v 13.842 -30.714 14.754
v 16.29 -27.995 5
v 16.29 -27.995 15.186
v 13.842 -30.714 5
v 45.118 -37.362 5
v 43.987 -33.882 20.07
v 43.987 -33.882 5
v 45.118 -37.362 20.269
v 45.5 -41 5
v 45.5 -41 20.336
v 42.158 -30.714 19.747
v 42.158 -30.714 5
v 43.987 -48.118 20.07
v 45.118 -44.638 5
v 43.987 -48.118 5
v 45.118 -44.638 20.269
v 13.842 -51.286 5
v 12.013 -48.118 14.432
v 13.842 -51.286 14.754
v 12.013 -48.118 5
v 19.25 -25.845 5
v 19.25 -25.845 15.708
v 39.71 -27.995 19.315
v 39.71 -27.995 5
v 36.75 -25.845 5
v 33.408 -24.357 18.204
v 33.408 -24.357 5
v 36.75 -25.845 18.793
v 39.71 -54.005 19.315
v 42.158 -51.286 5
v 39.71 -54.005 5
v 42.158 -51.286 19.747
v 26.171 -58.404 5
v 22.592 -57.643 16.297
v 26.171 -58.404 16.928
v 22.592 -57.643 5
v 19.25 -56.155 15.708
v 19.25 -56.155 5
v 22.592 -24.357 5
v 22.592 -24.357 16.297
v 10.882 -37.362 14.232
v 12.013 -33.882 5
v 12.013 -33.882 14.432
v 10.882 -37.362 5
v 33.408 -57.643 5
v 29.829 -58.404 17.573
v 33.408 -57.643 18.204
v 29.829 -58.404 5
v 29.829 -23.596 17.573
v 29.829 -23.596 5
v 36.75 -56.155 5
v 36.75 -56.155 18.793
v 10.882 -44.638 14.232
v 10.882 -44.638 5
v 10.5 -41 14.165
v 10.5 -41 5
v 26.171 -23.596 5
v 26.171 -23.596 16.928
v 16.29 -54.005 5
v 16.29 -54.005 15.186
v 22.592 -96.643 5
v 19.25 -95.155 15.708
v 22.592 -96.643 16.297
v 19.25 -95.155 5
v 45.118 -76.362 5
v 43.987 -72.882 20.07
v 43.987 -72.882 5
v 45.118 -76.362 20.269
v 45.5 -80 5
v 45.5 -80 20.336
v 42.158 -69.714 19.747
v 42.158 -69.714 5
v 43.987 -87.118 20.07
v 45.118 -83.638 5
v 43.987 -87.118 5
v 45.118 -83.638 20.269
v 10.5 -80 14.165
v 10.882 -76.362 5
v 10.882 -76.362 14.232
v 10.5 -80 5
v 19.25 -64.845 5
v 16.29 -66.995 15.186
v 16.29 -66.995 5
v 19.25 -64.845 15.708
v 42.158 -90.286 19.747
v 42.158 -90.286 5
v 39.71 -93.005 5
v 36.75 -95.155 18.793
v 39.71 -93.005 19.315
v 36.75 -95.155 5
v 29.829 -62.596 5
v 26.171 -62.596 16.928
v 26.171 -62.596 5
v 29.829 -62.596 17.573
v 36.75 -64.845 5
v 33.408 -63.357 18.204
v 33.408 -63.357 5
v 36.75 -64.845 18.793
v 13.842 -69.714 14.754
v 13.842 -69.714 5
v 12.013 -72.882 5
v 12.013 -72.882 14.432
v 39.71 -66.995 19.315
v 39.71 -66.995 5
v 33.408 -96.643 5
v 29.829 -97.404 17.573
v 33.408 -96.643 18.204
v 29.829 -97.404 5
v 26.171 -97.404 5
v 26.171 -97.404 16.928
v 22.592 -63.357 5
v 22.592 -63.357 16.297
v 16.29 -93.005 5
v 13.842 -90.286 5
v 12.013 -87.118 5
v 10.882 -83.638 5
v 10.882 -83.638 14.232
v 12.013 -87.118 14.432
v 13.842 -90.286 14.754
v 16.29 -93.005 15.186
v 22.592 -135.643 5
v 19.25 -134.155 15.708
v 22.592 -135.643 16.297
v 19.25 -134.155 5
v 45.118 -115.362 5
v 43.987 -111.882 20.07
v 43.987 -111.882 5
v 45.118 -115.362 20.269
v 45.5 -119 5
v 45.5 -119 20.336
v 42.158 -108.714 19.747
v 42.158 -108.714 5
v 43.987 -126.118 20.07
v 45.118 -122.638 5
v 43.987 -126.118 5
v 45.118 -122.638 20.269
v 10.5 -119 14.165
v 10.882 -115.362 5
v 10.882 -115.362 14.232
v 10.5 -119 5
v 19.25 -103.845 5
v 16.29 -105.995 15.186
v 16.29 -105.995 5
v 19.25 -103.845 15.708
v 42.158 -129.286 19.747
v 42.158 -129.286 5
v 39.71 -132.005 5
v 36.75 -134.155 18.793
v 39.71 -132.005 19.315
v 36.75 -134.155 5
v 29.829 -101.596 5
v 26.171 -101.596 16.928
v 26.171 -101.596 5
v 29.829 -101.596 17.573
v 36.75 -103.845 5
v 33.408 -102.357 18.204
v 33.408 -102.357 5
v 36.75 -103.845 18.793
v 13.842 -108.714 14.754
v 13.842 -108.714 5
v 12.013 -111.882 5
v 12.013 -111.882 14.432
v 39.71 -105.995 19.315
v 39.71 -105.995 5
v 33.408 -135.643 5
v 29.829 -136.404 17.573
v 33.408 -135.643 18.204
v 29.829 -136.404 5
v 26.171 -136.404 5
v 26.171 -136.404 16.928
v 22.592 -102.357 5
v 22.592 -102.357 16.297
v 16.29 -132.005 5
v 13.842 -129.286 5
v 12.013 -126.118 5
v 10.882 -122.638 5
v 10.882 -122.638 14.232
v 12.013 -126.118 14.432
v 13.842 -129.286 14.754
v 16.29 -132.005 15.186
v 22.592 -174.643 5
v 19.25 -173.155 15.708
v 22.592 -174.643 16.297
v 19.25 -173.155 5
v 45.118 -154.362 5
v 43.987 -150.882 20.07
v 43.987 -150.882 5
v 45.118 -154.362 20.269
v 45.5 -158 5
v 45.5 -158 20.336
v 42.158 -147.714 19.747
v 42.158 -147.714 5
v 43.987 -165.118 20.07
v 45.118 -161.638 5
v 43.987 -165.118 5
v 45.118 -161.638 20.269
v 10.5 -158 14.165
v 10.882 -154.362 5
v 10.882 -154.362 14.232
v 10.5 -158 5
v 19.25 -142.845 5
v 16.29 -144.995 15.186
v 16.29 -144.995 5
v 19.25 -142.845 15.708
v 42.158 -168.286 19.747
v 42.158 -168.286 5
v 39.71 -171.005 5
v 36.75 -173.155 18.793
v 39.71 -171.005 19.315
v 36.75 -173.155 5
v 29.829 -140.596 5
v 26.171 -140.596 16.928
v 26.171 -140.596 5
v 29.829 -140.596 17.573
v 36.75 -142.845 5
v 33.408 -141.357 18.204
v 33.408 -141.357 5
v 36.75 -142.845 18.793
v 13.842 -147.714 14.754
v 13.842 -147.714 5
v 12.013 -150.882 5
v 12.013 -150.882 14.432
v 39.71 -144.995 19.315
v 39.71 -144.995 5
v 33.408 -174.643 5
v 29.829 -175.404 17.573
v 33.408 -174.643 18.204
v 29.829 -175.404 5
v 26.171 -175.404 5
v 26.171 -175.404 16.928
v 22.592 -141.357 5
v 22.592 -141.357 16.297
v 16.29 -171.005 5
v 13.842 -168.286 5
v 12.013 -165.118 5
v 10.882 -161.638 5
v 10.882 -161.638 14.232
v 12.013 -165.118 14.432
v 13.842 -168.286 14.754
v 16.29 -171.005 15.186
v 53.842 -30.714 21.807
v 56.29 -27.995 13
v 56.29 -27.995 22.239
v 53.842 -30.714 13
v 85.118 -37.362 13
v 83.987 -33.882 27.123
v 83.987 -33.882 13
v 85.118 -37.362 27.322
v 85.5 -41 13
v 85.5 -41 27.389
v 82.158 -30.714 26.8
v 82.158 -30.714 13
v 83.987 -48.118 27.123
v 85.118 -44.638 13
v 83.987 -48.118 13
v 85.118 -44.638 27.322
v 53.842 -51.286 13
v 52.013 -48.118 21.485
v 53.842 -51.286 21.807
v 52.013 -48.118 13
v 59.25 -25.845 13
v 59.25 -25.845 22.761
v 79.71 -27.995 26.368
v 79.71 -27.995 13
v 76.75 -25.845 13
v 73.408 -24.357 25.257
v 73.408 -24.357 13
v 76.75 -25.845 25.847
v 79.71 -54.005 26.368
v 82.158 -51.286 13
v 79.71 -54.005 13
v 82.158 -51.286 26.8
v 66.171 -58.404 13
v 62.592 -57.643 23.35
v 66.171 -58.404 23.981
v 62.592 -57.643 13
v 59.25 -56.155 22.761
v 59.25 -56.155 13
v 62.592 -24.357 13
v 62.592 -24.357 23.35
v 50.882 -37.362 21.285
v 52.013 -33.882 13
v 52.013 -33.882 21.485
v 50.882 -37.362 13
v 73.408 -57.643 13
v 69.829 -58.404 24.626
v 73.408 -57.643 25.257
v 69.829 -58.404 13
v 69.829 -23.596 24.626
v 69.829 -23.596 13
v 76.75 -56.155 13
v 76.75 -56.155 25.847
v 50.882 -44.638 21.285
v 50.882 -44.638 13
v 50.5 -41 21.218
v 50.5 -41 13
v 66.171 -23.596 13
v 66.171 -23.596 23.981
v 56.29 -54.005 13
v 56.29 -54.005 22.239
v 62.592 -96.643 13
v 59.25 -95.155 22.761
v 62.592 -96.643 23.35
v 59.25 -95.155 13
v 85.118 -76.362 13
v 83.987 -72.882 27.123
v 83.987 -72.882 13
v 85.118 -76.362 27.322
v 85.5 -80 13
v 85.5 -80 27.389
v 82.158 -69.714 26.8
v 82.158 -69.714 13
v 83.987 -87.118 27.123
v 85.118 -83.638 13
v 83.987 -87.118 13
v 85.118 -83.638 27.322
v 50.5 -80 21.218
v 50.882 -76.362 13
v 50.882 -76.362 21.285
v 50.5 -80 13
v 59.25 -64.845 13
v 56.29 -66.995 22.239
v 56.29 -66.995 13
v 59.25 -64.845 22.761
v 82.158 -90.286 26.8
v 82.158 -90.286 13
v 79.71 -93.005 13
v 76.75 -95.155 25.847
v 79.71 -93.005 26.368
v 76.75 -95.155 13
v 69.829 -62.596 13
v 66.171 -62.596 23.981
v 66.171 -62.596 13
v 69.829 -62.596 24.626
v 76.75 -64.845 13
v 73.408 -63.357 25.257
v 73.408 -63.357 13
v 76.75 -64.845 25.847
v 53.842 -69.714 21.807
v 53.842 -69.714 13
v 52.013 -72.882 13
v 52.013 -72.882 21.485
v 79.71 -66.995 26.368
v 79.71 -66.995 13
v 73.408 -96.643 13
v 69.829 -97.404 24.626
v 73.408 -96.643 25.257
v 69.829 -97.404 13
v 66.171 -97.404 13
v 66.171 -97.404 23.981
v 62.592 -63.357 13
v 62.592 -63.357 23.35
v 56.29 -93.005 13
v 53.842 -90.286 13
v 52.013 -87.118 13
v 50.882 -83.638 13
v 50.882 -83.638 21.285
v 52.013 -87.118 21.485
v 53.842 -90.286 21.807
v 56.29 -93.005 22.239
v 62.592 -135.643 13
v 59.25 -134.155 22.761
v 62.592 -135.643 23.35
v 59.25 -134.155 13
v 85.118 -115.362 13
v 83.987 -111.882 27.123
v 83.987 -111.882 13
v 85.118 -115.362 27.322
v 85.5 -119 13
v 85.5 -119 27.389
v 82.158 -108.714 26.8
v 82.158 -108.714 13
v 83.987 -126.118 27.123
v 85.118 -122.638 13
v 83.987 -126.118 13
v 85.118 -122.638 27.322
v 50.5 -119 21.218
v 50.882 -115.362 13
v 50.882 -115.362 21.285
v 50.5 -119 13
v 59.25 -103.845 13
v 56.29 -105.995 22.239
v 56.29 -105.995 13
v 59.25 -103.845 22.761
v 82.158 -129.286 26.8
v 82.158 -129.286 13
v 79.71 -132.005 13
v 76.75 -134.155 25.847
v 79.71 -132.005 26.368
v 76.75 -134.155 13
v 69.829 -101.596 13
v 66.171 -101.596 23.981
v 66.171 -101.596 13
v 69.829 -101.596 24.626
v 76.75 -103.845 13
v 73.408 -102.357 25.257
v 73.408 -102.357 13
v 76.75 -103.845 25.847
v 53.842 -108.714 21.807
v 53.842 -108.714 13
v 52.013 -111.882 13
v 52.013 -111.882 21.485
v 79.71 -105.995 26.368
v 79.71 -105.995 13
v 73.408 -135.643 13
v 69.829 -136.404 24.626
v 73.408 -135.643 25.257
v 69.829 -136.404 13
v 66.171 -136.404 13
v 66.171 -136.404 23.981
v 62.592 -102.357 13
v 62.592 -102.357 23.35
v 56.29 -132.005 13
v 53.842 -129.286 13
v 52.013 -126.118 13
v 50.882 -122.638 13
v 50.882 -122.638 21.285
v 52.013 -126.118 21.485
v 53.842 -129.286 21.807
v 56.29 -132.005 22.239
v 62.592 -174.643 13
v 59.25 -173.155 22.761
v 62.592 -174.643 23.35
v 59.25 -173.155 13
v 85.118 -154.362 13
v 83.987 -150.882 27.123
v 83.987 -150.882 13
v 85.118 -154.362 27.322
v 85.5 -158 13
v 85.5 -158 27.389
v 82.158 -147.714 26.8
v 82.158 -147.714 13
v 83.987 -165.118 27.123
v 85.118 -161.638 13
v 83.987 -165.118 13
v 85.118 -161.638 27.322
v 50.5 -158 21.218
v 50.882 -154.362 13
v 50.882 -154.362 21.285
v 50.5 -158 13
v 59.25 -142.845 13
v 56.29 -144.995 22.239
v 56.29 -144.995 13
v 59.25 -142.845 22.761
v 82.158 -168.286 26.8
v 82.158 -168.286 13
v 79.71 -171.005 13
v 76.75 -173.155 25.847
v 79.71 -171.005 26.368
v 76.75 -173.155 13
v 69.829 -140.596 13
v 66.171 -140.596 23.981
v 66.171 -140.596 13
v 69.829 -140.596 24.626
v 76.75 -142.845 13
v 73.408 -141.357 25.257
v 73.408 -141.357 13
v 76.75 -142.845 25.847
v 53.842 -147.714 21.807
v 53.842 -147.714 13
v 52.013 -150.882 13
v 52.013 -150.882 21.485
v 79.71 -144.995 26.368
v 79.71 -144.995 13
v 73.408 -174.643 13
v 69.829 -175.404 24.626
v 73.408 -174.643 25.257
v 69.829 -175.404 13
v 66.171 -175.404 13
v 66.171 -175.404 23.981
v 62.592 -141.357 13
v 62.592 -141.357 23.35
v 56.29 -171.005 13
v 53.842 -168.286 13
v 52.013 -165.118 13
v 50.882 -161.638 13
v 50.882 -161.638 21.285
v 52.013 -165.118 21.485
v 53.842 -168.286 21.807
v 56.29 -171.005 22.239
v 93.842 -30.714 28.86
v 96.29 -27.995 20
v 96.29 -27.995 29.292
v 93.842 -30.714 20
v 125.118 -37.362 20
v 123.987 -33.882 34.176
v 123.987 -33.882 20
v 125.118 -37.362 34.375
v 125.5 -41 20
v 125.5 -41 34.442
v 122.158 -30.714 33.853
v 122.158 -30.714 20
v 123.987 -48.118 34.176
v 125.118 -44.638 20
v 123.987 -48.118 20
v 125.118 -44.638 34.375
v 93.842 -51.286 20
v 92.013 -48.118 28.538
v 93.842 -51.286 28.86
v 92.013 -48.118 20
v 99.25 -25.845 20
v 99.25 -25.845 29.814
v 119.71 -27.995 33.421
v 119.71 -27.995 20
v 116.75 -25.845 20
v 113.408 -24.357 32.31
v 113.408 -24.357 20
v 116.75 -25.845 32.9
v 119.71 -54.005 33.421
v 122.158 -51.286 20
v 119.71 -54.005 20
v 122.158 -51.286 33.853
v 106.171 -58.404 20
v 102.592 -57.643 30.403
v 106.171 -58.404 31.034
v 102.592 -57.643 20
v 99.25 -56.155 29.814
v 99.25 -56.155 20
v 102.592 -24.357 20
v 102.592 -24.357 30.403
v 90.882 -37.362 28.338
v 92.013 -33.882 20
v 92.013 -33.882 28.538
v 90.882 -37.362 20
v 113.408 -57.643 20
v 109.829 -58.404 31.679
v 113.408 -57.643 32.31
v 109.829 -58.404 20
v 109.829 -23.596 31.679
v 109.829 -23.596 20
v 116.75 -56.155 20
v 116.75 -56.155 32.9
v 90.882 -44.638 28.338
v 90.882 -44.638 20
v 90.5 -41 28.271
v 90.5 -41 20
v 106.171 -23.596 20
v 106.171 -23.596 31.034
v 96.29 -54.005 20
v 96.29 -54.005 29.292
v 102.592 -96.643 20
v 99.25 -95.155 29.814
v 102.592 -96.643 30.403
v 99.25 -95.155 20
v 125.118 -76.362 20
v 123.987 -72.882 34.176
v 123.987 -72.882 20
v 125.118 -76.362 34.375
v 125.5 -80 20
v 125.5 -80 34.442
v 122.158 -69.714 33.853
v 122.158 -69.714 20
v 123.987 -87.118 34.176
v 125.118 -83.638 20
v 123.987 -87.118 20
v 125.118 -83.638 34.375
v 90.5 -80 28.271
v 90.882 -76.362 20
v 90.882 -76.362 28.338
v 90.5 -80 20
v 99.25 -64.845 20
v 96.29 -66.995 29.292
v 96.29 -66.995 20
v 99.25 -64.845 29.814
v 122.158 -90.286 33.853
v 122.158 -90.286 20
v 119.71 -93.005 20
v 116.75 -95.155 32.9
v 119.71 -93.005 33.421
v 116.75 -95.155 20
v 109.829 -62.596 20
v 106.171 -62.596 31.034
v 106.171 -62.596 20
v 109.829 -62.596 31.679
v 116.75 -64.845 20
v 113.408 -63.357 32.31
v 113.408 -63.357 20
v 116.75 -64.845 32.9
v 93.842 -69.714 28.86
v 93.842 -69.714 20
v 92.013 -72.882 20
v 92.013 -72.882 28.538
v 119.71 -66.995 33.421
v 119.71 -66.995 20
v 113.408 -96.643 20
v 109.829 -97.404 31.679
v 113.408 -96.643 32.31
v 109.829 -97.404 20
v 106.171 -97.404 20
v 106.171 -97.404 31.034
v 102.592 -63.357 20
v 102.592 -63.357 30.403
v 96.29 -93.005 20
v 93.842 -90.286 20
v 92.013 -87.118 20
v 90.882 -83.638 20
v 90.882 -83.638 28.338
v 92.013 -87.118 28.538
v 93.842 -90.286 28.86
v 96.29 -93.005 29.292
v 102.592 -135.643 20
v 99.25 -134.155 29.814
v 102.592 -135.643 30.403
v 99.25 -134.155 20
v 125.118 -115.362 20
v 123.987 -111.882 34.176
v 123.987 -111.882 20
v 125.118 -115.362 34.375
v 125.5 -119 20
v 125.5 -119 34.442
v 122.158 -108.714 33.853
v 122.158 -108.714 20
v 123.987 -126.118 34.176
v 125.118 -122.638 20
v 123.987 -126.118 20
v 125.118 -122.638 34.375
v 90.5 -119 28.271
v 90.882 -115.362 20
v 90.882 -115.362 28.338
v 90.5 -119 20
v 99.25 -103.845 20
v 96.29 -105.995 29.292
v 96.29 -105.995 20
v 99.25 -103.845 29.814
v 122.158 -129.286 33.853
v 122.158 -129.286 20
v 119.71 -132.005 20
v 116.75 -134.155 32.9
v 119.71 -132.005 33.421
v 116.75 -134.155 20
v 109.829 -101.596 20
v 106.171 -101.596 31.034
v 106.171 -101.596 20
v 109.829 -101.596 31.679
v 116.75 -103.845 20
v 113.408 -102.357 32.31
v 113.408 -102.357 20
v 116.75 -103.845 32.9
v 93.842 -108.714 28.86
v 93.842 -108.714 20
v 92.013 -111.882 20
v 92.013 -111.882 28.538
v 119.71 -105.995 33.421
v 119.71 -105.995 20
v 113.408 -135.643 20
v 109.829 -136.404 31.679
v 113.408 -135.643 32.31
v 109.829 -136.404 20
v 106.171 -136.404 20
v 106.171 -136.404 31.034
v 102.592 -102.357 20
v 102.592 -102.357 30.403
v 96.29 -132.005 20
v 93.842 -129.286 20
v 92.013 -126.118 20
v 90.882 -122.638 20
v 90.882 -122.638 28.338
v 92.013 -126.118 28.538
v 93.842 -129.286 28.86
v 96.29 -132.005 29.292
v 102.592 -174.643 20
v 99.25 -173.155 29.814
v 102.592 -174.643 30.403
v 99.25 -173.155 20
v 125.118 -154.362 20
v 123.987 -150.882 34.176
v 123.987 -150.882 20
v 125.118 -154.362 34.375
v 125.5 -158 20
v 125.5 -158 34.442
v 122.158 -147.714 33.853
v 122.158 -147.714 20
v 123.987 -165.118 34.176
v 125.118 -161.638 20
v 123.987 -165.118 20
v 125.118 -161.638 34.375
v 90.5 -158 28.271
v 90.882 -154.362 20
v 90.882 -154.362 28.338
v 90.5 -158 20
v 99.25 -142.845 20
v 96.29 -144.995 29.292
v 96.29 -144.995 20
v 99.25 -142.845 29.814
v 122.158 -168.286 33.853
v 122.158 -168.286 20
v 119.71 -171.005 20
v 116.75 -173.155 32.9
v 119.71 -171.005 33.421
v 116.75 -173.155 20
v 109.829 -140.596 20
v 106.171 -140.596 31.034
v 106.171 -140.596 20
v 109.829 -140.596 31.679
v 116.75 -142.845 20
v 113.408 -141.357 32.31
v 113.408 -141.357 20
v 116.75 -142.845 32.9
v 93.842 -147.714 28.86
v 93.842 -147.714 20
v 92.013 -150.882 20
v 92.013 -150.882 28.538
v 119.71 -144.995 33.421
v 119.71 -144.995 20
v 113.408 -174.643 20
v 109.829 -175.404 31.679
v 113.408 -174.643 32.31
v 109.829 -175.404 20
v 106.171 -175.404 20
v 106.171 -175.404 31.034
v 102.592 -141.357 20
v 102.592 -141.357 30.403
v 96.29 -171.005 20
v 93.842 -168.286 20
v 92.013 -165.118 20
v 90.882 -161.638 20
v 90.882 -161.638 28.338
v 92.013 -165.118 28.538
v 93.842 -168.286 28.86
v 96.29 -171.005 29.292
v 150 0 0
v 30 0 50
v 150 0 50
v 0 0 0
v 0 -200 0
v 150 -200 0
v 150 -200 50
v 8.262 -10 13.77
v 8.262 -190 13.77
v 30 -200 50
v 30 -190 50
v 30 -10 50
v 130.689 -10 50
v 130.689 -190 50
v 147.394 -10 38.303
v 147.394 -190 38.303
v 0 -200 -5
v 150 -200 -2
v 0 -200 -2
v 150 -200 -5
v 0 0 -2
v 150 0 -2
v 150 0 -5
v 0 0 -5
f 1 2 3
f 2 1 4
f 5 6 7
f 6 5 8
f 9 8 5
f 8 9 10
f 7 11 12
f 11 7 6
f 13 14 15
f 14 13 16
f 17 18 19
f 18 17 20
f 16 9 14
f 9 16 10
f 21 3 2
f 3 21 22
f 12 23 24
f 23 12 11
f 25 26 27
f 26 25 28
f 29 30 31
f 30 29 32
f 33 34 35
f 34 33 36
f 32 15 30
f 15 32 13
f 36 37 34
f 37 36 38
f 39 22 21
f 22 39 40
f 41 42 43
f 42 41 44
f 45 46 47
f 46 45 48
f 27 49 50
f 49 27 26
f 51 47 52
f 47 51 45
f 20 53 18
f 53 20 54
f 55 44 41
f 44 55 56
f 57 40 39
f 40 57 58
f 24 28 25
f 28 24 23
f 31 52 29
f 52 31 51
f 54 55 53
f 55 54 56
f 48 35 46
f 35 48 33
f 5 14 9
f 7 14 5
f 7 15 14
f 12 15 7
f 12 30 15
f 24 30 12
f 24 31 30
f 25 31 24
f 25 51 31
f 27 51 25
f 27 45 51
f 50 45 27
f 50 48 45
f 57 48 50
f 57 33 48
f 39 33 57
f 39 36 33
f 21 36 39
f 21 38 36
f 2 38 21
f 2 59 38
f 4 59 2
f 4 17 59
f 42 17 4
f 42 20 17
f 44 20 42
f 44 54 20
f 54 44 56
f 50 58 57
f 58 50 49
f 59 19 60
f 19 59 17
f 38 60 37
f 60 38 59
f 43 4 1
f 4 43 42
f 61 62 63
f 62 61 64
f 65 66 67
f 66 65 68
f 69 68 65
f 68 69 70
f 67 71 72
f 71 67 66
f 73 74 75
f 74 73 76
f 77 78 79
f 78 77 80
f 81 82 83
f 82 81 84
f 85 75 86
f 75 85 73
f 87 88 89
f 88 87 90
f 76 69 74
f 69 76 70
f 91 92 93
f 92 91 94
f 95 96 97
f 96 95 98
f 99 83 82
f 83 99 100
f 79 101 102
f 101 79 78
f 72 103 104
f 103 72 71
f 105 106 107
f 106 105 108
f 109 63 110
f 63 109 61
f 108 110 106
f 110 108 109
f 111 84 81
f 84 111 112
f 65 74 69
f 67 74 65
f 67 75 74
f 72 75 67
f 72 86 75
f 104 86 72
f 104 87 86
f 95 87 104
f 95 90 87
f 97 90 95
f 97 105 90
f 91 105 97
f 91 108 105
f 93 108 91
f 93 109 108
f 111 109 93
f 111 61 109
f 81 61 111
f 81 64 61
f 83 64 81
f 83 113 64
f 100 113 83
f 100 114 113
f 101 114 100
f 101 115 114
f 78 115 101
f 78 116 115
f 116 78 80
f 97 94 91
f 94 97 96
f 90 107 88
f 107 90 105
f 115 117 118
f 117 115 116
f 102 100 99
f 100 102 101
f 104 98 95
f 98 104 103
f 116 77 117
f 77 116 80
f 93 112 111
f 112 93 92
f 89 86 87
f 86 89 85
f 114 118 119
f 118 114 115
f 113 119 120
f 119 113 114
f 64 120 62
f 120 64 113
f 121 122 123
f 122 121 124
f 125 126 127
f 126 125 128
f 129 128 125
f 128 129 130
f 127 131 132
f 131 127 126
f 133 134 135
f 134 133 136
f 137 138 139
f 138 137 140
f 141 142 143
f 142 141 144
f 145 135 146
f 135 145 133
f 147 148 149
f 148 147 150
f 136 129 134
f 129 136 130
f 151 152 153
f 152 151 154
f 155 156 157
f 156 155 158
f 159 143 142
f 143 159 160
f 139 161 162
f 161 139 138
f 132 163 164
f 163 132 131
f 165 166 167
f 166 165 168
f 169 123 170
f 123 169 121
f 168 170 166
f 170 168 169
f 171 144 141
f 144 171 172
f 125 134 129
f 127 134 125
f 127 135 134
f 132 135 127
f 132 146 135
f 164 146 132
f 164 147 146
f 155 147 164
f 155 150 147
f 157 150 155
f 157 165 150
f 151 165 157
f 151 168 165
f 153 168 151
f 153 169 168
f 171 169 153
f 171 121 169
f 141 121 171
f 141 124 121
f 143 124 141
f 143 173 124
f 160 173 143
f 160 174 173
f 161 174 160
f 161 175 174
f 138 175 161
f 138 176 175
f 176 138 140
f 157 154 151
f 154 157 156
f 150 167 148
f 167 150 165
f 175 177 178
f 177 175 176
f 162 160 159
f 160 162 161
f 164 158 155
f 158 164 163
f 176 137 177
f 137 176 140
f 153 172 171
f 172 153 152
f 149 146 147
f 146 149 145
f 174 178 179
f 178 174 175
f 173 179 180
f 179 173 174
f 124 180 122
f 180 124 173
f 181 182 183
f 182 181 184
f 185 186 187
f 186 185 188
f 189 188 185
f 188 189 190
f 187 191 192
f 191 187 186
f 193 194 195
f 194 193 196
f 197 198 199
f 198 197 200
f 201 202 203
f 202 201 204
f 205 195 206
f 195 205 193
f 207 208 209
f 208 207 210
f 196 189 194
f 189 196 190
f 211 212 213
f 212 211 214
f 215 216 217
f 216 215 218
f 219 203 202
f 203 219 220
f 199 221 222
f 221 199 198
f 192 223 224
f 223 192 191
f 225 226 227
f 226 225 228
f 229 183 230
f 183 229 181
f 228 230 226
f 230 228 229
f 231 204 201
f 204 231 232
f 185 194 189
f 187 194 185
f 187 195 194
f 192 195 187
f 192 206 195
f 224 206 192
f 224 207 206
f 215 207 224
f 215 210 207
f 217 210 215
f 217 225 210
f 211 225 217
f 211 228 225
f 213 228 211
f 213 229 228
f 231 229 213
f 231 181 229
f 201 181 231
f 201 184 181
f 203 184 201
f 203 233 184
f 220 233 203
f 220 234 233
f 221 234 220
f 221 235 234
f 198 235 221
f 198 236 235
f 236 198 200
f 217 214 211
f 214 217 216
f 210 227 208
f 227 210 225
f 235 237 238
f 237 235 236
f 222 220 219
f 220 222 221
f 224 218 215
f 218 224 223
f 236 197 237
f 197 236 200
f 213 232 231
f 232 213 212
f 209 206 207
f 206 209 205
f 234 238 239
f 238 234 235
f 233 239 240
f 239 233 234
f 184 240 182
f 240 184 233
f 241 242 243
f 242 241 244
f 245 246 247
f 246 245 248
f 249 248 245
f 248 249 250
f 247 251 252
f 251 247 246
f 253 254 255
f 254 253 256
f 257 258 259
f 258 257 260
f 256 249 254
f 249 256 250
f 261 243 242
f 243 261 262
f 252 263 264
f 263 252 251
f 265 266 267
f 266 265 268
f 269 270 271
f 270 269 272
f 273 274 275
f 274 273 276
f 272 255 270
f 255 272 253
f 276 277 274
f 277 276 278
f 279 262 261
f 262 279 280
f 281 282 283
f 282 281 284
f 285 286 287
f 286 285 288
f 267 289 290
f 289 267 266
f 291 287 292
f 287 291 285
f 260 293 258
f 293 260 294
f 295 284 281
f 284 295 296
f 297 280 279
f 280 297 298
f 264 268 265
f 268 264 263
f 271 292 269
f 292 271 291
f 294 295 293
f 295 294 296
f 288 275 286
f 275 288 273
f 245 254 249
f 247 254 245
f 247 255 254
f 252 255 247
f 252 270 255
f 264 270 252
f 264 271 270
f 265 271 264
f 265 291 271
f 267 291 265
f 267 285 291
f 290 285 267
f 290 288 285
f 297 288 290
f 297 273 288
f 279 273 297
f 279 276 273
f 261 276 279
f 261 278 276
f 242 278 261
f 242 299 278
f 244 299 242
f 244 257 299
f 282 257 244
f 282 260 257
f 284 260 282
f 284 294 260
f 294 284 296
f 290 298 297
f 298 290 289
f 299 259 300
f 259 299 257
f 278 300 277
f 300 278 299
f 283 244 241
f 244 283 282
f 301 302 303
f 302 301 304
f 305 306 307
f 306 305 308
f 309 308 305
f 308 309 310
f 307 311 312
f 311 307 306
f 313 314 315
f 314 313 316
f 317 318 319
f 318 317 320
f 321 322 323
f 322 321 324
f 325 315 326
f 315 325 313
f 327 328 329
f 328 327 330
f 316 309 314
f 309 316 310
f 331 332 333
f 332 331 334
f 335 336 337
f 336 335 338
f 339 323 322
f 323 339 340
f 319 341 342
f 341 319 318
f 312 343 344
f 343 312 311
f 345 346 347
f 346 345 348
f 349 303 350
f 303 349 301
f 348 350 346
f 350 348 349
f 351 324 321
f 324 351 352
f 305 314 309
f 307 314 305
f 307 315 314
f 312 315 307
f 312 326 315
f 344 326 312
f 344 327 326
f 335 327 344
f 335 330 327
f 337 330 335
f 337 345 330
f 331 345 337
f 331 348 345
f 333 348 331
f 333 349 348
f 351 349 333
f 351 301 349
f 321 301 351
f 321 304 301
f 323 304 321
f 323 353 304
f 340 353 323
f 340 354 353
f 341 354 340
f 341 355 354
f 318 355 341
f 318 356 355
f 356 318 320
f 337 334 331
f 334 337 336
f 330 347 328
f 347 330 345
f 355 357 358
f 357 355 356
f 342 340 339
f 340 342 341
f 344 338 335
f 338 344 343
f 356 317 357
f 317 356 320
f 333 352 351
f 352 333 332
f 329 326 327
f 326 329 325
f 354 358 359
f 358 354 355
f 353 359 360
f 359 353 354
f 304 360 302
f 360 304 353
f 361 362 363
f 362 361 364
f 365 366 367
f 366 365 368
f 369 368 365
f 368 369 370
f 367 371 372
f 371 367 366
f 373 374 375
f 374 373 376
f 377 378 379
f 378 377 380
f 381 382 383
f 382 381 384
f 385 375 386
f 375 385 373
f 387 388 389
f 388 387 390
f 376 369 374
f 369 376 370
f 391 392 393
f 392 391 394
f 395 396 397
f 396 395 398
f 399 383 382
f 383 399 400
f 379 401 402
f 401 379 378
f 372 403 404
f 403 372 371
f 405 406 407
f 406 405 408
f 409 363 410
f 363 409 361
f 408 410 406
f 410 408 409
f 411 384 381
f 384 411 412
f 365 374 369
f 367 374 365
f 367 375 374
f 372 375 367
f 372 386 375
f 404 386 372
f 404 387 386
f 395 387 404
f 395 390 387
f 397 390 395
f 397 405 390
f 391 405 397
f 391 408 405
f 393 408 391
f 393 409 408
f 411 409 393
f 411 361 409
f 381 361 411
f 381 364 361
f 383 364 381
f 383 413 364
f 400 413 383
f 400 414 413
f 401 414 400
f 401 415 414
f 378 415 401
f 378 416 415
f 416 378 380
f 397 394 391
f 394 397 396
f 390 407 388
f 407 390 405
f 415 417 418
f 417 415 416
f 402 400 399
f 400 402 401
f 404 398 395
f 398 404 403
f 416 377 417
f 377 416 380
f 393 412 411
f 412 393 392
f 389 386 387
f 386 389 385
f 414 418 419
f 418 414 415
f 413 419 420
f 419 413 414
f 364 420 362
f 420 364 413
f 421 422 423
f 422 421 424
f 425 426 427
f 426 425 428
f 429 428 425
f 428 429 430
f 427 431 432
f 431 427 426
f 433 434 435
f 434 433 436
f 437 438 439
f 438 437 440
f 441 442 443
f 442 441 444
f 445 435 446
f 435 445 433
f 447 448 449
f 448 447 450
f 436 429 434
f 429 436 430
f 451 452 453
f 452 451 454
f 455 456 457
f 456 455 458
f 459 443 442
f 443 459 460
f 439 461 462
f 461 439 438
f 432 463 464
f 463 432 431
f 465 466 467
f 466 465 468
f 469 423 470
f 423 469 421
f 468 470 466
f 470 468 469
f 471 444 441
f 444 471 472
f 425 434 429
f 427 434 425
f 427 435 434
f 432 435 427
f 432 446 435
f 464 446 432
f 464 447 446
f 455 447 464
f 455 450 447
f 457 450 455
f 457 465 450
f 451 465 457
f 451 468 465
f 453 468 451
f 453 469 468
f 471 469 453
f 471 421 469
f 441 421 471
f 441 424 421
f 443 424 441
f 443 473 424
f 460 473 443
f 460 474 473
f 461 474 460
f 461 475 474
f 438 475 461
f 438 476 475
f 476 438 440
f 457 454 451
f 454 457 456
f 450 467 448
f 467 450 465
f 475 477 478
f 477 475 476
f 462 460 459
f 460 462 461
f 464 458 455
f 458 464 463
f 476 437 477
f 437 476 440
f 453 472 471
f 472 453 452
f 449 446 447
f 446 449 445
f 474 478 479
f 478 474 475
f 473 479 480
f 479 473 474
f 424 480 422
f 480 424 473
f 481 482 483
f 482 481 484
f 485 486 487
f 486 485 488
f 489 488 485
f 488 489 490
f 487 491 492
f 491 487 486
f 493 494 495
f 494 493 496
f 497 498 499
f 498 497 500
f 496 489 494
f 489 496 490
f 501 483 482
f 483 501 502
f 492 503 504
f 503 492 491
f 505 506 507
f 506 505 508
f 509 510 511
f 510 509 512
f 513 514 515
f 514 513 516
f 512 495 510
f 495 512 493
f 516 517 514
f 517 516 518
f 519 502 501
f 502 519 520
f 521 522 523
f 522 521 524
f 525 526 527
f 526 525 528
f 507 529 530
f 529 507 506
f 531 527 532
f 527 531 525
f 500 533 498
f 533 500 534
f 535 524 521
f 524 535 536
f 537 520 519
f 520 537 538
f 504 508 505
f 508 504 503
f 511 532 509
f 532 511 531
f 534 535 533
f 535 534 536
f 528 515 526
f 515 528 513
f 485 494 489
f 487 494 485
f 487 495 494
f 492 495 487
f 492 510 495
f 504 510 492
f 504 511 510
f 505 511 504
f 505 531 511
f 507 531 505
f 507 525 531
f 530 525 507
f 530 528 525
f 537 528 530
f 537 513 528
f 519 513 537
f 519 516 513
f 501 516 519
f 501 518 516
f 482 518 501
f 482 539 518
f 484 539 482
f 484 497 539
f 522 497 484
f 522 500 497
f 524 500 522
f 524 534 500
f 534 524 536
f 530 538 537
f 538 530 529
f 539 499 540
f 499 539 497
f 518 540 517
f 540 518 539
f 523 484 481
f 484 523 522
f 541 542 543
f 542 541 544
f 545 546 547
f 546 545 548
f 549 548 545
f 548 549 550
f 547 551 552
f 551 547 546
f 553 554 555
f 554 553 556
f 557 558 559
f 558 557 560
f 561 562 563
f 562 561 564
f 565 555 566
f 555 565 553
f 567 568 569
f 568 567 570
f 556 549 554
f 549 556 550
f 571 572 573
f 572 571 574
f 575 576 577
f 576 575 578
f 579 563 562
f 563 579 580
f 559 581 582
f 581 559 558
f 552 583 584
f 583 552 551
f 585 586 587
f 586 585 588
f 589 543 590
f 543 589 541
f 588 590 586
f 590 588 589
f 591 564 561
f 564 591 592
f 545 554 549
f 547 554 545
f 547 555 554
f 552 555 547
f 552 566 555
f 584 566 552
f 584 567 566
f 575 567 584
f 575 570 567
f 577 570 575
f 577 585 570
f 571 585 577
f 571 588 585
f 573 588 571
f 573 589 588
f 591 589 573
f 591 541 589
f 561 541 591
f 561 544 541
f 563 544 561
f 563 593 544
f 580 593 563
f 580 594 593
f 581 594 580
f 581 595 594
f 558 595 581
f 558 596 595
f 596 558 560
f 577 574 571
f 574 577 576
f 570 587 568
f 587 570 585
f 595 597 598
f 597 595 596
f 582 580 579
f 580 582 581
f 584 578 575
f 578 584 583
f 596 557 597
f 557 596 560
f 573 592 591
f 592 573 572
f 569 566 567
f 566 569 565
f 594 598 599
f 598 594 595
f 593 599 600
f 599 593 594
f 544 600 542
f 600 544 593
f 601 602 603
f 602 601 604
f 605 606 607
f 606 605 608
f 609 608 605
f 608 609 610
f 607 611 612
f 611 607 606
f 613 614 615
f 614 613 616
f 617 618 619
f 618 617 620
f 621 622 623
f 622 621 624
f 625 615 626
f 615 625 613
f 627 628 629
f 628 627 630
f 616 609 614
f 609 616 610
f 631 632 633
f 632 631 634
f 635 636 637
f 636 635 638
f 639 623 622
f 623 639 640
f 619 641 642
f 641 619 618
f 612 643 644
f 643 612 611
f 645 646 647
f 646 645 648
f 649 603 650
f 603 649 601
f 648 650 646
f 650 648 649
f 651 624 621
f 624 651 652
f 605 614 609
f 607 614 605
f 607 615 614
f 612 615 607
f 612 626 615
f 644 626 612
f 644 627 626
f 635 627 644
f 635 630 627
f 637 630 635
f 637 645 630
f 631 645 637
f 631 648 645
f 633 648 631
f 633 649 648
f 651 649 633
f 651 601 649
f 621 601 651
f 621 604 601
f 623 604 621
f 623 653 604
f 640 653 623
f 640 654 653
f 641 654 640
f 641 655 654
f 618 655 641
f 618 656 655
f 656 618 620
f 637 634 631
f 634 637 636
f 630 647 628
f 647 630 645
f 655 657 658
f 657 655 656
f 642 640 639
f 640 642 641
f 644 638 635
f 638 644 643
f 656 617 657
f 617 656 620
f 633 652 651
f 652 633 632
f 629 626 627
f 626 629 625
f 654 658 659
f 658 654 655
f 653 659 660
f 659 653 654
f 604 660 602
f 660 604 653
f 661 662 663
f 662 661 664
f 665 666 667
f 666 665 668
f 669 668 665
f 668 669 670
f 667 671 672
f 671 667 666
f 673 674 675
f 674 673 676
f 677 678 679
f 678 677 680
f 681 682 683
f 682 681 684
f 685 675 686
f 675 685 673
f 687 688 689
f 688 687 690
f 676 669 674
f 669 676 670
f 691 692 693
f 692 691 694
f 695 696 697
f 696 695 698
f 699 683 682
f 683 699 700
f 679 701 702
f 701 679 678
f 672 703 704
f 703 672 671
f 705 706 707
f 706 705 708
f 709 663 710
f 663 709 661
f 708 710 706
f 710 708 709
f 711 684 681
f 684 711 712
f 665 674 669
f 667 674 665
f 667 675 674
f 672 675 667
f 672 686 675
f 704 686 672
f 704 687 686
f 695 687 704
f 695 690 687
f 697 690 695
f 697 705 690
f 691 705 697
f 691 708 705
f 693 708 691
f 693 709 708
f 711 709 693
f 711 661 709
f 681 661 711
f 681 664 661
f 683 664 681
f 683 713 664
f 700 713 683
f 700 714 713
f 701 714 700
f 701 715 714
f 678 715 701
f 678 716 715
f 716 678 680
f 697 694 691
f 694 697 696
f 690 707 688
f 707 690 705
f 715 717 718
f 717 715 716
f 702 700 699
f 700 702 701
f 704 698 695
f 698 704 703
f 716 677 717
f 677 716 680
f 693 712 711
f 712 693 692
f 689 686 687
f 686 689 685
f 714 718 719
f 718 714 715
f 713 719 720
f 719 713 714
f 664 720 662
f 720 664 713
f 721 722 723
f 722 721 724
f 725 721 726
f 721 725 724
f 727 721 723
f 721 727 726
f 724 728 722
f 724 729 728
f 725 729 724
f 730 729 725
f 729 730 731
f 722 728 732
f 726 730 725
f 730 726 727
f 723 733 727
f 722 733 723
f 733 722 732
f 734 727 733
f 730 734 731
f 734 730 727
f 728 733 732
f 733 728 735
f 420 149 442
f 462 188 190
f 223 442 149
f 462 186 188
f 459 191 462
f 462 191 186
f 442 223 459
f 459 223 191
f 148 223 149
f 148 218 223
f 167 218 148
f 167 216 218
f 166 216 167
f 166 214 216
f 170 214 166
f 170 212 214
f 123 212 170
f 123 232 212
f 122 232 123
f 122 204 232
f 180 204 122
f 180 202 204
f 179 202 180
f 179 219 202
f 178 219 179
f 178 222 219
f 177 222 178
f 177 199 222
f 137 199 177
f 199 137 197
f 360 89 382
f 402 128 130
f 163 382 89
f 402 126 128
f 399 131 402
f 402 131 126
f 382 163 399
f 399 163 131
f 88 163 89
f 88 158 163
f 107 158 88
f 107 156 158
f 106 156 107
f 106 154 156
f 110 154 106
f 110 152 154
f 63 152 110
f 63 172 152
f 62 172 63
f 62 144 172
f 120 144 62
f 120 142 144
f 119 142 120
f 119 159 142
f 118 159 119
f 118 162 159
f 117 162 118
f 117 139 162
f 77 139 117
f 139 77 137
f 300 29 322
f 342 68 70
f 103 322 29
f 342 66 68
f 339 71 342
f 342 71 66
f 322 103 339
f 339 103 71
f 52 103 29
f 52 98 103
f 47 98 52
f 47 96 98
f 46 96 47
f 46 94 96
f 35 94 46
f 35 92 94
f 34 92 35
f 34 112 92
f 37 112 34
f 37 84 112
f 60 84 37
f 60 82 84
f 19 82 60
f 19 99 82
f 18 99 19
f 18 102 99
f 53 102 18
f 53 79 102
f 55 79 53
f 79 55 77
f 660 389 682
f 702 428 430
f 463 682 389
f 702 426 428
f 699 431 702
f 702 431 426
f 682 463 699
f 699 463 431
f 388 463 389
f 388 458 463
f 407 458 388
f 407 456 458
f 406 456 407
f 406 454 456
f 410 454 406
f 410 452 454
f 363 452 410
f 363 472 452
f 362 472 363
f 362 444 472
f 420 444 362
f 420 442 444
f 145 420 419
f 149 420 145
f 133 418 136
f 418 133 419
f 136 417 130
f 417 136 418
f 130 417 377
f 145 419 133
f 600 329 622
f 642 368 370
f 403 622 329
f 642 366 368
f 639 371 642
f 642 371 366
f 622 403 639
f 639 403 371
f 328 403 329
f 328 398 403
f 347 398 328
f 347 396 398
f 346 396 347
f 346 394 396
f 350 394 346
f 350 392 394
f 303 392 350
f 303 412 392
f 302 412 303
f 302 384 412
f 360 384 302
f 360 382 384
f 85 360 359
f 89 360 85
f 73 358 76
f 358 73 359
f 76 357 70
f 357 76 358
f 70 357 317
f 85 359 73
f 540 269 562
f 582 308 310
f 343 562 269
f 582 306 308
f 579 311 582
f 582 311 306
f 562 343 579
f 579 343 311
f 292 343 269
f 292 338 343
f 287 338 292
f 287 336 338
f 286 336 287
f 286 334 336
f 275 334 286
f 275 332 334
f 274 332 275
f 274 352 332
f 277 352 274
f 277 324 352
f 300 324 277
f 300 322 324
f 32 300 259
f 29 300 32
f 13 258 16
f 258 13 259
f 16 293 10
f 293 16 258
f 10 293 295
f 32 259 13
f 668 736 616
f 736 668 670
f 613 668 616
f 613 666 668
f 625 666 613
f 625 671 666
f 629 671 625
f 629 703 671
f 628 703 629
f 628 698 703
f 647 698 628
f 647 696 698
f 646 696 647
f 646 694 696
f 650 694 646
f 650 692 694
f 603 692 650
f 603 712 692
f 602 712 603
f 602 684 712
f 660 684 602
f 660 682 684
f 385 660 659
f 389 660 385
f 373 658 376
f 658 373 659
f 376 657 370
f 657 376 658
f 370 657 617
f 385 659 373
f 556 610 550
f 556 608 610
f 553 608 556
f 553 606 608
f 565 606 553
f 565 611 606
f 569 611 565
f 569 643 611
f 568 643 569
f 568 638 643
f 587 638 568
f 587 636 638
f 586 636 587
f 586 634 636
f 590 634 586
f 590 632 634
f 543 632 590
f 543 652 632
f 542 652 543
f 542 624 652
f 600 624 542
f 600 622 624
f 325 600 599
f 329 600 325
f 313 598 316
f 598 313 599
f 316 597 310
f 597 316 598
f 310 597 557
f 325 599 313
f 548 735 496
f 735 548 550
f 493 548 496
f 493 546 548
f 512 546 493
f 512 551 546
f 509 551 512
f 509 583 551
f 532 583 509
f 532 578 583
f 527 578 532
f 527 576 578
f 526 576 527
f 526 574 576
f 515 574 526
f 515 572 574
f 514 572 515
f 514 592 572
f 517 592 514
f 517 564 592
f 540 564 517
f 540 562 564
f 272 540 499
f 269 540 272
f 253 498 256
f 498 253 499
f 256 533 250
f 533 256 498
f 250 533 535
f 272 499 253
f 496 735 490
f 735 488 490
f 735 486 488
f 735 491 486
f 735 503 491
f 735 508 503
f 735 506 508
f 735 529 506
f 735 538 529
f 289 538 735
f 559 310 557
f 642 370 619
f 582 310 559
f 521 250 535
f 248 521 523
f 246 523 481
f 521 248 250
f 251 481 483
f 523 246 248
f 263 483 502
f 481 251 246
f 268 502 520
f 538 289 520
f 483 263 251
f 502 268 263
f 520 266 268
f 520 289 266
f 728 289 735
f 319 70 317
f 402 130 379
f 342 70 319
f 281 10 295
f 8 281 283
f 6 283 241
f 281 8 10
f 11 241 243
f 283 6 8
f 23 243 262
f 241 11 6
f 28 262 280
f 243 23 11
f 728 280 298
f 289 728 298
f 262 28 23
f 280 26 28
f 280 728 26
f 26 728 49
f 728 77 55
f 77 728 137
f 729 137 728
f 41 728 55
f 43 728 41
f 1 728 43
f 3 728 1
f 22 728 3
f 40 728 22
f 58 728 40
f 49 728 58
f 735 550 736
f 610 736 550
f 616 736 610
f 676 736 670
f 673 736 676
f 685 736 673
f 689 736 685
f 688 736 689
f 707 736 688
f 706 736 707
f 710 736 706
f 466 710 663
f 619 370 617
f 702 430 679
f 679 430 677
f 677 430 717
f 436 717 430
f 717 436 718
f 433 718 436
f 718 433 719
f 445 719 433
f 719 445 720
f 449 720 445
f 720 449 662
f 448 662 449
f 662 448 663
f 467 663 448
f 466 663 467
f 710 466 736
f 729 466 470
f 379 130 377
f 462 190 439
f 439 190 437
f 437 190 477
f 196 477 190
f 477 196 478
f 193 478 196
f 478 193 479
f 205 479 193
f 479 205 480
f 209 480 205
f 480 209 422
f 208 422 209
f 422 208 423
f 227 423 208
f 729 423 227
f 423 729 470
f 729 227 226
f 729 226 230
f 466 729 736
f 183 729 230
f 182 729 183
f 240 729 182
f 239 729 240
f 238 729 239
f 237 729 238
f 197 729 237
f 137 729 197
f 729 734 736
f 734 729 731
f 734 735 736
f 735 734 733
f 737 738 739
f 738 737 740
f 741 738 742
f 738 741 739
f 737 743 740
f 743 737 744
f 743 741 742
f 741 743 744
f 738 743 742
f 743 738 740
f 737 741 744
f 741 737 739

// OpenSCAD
difference() {
    rotate([90,0,0])
    linear_extrude(height=200)
    polygon(points=[[0,0],[150,0],[150,50],[30,50]]);

    translate([45,-10,110])
    rotate([0,125,0])
    rotate([90,0,0])
    linear_extrude(height=180)
    polygon(points=[[0,0],[125,0],[0,125]]);
    translate([28,-41,5])
    bottle_level();
    translate([68,-41,13])
    bottle_level();
    translate([108,-41,20])
    bottle_level();
}


translate([0,0,-5])
rotate([0,0,270])
cube([200,150,3]);



module bottle_level() {
    union() {
        cylinder(h=20,d=35);
        translate([0,-39,0])
        cylinder(h=20,d=35);
        translate([0,-78,0])
        cylinder(h=20,d=35);
        translate([0,-117,0])
        cylinder(h=20,d=35);
       
    }
}
